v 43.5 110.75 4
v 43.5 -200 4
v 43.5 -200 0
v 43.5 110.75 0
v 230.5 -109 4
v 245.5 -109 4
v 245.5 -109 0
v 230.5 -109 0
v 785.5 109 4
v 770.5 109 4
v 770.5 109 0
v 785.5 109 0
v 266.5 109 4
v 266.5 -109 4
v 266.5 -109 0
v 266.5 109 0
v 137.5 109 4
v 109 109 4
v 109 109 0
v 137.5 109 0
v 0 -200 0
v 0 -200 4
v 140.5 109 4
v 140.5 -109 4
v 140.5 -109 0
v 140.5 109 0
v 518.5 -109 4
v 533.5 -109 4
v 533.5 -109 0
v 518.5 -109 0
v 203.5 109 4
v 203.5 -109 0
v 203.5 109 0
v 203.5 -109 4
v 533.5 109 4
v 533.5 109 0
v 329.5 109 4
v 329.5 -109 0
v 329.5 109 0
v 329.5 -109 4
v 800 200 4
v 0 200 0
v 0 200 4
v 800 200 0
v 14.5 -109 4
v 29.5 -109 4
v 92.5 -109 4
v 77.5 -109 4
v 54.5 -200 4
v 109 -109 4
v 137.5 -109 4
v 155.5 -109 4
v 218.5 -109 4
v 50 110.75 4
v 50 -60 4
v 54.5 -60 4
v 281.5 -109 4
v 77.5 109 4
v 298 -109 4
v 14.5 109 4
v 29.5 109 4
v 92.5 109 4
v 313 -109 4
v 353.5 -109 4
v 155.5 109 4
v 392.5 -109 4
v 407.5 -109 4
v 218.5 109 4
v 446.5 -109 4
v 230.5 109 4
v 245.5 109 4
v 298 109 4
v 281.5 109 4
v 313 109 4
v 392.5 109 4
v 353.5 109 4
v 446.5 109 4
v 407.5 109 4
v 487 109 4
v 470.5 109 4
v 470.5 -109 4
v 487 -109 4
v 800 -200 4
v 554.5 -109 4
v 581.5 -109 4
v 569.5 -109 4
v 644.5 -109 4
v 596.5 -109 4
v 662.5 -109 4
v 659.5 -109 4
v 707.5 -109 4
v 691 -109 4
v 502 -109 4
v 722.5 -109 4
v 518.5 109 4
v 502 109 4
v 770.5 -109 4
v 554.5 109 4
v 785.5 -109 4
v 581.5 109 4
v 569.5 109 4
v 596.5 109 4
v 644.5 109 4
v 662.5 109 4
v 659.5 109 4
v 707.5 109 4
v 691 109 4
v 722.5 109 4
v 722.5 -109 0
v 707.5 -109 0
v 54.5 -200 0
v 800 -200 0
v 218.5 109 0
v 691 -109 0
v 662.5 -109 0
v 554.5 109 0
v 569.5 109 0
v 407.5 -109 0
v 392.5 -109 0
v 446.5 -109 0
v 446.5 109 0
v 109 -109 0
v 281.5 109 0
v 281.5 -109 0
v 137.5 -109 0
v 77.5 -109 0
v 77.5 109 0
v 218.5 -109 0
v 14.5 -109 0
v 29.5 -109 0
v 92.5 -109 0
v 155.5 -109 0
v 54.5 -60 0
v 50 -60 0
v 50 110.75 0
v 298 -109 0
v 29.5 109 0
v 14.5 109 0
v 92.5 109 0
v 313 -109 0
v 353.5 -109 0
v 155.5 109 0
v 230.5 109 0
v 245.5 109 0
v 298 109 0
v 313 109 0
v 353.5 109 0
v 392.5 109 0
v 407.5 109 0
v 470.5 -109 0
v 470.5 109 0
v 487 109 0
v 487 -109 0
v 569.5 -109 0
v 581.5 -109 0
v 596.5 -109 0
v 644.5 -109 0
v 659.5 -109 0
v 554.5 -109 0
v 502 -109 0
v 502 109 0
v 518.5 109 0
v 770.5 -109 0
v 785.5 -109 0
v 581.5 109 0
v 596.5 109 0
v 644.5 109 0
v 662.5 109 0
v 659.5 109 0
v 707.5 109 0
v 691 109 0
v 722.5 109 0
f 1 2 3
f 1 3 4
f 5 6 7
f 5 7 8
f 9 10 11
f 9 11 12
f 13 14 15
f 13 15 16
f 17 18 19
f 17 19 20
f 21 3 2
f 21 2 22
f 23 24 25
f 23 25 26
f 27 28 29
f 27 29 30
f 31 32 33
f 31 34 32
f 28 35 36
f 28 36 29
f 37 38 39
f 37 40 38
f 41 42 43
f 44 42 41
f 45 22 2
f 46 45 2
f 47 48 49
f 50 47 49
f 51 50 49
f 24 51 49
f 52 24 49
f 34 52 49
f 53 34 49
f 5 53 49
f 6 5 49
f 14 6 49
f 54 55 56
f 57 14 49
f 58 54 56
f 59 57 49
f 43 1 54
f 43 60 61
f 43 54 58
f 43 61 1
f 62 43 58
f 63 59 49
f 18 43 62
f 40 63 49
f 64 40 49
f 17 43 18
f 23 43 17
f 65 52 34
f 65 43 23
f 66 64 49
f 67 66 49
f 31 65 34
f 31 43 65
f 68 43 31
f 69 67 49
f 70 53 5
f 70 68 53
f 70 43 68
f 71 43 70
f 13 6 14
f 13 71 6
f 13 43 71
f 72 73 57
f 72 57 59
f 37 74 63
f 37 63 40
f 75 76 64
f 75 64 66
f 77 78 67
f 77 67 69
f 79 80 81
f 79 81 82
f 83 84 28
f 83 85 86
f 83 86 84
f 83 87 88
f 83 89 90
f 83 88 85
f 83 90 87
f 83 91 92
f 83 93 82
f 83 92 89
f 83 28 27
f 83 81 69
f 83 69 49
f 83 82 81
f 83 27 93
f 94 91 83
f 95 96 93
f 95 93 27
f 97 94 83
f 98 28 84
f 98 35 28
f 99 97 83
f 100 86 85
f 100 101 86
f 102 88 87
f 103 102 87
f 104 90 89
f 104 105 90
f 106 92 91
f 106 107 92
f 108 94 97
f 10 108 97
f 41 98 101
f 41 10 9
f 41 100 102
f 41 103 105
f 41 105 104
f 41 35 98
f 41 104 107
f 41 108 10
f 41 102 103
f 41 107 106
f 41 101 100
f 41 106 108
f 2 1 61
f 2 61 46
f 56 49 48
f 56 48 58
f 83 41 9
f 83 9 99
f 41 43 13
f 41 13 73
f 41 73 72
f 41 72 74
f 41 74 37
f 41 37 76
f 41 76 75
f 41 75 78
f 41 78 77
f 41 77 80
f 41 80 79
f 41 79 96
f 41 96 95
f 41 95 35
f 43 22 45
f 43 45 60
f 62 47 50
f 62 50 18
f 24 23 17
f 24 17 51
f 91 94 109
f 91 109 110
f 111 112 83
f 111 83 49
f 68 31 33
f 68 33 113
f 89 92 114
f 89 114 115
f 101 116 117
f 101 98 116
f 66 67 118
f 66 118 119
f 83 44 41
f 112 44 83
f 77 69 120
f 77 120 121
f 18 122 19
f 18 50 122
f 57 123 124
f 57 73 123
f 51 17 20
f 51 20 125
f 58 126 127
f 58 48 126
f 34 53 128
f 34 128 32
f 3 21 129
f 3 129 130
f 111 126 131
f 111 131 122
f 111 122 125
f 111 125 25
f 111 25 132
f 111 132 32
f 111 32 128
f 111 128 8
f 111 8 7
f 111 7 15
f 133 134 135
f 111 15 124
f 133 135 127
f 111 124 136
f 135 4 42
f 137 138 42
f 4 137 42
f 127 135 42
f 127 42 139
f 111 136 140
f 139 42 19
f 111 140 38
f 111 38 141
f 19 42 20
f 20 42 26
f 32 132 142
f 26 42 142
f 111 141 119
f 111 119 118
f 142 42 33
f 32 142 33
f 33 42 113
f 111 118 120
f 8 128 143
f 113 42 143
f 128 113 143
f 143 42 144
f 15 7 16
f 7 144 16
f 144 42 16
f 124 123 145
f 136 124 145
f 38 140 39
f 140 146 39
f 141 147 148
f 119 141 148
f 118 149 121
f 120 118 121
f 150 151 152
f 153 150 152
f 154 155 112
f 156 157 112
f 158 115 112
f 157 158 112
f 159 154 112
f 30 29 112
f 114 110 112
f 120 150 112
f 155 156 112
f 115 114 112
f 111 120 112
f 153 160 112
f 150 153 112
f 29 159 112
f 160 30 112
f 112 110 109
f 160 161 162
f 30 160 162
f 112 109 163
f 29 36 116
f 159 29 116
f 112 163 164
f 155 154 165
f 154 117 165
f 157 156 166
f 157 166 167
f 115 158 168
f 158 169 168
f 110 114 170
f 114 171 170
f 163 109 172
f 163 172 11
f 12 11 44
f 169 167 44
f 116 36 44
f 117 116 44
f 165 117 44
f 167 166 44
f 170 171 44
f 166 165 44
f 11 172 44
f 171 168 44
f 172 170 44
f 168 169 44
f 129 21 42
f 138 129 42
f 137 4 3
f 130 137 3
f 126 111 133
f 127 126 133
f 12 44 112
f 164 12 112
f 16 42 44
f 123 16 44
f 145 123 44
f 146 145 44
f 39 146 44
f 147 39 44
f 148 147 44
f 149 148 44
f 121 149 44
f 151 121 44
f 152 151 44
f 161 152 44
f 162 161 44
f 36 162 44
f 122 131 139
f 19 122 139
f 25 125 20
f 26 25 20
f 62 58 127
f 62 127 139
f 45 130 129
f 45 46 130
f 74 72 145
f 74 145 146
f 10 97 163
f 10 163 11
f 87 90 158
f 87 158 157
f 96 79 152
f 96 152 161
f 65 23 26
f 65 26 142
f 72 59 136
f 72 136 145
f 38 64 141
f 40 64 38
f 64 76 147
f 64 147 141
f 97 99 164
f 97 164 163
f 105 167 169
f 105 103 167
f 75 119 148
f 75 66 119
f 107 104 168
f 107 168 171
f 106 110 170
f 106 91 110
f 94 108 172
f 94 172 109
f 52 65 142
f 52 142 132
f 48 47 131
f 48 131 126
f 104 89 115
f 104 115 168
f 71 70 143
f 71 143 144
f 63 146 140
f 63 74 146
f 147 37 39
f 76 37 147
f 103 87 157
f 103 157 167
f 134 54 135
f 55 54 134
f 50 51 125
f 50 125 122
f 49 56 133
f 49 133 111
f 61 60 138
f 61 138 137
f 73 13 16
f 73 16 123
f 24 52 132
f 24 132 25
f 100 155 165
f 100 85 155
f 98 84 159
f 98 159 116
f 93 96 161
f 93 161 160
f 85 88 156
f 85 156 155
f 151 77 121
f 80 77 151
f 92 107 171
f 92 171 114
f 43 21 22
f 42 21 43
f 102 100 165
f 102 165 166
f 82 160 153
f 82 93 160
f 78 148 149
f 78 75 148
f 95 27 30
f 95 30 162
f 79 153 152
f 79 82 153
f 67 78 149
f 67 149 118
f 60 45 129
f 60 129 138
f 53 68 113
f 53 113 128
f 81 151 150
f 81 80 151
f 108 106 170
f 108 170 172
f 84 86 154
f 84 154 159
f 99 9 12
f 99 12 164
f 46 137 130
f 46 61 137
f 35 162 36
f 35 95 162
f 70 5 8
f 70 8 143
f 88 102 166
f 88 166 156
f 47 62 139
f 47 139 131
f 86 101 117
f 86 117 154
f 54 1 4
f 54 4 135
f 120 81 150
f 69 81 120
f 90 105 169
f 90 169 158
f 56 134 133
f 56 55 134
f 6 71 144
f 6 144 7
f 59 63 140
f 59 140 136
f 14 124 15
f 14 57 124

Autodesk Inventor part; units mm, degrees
ref_plane "YZ Plane" through (0, 0, 0) normal (1, 0, 0) x (0, 1, 0)
ref_plane "XZ Plane" through (0, 0, 0) normal (0, 1, 0) x (-1, 0, 0)
sketch "ferrite_layer_outline_sketch" plane through (0, 0, 0) normal (0, 0, 1) x (1, 0, 0)
  line L0 (0, 200) -> (800, 200)
  line L1 (800, 200) -> (800, -200)
  line L2 (800, -200) -> (0, -200)
  line L3 (0, -200) -> (0, 200)
  line L4 (-160, 0) -> (960, 0) projected
  line L5 (400, 200) -> (400, -200) construction
  line L6 (400, 366.8869) -> (400, -324.3455) construction
  line L7 (400, 200) -> (400, -200)
  point P0 (0, 0)
  point P1 (0, 0)
  point P2 (0, 0)
  point P3 (0, 0)
  point P4 (20, 0)
  dimension "d0" = 800
  dimension "d1" = 400
extrude "Sheet Extrude" add sketch "ferrite_layer_outline_sketch" along normal blind 4
ref_plane "acrylic_sheet_plane" through (0, 0, 4) normal (0, 0, 1) x (1, 0, 0)
sketch "Sketch4" plane through (0, 0, 4) normal (0, 0, 1) x (1, 0, 0)
  line L0 (14.5, 109) -> (29.5, 109)
  line L1 (29.5, 109) -> (29.5, -109)
  line L2 (29.5, -109) -> (14.5, -109)
  line L3 (14.5, -109) -> (14.5, 109)
  line L4 (-12.6534, 0) -> (47.471, 0)
  line L5 (0, 200) -> (0, -200) projected
  line L6 (800, 200) -> (0, 200) projected
  line L7 (0, -200) -> (800, -200) projected
  point P0 (0, 0)
  point P1 (14.5, 0)
  point P2 (0, 0)
  dimension "d43" = 15
  dimension "d44" = 218
  dimension "d45" = 14.5
extrude "Extrusion9" cut sketch "Sketch4" against normal through all
pattern_linear "Rectangular Pattern 7 fer" count 7 spacing 126 along (1, 0, 0) of "Extrusion9"
pattern_linear "Rectangular Pattern 8 fer" count 8 spacing 108 along (1, 0, 0) of "Extrusion9"
pattern_linear "pattern_test_#_of_ferrites 9 fer" count 9 spacing 94.5 along (1, 0, 0) of "Extrusion9"
pattern_linear "Rectangular Pattern 10 fer" [suppressed]
pattern_linear "Rectangular Pattern 13" count 13 spacing 63 along (1, 0, 0) of "Extrusion9"
sketch "Sketch5" plane through (0, 0, 4) normal (0, 0, 1) x (1, 0, 0)
  line L0 (0, 200) -> (0, -200) projected
  line L1 (0, 150) -> (800, 150)
  line L2 (800, -200) -> (800, 200) projected
  line L3 (800, 200) -> (0, 200) projected
  line L4 (0, -200) -> (800, -200) projected
  line L5 (0, -150) -> (800, -150)
  point P0 (0, 0)
  dimension "d66" = 50
  dimension "d68" = 50
sketch "Sketch11" plane through (0, 0, 4) normal (0, 0, 1) x (1, 0, 0)
  circle A0 centre (47, 7.75) radius 3
  line L0 (800, 200) -> (0, 200) projected
  line L1 (0, 200) -> (0, -200) projected
  circle A1 centre (47, -72) radius 3
  line L2 (0, -200) -> (800, -200) projected
  point P0 (0, 0)
  dimension "d85" = 6
  dimension "d86" = 192.25
  dimension "d87" = 47
  dimension "d88" = 6
  dimension "d89" = 128
  dimension "d90" = 47
extrude "Extrusion15" cut sketch "Sketch11" against normal through all
sketch "Sketch12" plane through (0, 0, 4) normal (0, 0, 1) x (1, 0, 0)
  line L0 (0, -200) -> (800, -200) projected
  line L1 (43.5, 110.75) -> (50, 110.75)
  line L2 (50, 110.75) -> (50, -200)
  line L3 (50, -200) -> (43.5, -200)
  line L4 (43.5, -200) -> (43.5, 110.75)
  line L5 (0, 200) -> (0, -200) projected
  line L6 (50, -60) -> (54.5, -60)
  line L7 (54.5, -60) -> (54.5, -200)
  line L8 (54.5, -200) -> (50, -200)
  point P0 (0, 0)
  dimension "d97" = 310.75
  dimension "d98" = 6.5
  dimension "d99" = 43.5
  dimension "d104" = 4.5
  dimension "d105" = 140
extrude "wire_guide Cut" cut sketch "Sketch12" against normal through all
equation "\"d0\" = track_length"
equation "\"d1\" = track_width"
equation "\"d43\" = ferrite_width"
equation "\"d44\" = ferrite_length"
equation "\"d45\" = gap_distance"
equation "\"d50\" = parameter_5"
equation "\"d62\" = test_parameter_5"
equation "\"track_length\" = 800"
equation "\"track_width\" = 400"
equation "\"gap_distance\" = 14.5"
equation "\"ferrite_length\" = 218"
equation "\"ferrite_width\" = 15"
equation "\"ferrite_height\" = 8"
equation "\"acrylic_sheet_8mm\" = 8"
equation "\"parameter_5\" = 126"
equation "\"test_parameter_5\" = 94.5"
properties part number "ferrite_layer_dex_1R1"
